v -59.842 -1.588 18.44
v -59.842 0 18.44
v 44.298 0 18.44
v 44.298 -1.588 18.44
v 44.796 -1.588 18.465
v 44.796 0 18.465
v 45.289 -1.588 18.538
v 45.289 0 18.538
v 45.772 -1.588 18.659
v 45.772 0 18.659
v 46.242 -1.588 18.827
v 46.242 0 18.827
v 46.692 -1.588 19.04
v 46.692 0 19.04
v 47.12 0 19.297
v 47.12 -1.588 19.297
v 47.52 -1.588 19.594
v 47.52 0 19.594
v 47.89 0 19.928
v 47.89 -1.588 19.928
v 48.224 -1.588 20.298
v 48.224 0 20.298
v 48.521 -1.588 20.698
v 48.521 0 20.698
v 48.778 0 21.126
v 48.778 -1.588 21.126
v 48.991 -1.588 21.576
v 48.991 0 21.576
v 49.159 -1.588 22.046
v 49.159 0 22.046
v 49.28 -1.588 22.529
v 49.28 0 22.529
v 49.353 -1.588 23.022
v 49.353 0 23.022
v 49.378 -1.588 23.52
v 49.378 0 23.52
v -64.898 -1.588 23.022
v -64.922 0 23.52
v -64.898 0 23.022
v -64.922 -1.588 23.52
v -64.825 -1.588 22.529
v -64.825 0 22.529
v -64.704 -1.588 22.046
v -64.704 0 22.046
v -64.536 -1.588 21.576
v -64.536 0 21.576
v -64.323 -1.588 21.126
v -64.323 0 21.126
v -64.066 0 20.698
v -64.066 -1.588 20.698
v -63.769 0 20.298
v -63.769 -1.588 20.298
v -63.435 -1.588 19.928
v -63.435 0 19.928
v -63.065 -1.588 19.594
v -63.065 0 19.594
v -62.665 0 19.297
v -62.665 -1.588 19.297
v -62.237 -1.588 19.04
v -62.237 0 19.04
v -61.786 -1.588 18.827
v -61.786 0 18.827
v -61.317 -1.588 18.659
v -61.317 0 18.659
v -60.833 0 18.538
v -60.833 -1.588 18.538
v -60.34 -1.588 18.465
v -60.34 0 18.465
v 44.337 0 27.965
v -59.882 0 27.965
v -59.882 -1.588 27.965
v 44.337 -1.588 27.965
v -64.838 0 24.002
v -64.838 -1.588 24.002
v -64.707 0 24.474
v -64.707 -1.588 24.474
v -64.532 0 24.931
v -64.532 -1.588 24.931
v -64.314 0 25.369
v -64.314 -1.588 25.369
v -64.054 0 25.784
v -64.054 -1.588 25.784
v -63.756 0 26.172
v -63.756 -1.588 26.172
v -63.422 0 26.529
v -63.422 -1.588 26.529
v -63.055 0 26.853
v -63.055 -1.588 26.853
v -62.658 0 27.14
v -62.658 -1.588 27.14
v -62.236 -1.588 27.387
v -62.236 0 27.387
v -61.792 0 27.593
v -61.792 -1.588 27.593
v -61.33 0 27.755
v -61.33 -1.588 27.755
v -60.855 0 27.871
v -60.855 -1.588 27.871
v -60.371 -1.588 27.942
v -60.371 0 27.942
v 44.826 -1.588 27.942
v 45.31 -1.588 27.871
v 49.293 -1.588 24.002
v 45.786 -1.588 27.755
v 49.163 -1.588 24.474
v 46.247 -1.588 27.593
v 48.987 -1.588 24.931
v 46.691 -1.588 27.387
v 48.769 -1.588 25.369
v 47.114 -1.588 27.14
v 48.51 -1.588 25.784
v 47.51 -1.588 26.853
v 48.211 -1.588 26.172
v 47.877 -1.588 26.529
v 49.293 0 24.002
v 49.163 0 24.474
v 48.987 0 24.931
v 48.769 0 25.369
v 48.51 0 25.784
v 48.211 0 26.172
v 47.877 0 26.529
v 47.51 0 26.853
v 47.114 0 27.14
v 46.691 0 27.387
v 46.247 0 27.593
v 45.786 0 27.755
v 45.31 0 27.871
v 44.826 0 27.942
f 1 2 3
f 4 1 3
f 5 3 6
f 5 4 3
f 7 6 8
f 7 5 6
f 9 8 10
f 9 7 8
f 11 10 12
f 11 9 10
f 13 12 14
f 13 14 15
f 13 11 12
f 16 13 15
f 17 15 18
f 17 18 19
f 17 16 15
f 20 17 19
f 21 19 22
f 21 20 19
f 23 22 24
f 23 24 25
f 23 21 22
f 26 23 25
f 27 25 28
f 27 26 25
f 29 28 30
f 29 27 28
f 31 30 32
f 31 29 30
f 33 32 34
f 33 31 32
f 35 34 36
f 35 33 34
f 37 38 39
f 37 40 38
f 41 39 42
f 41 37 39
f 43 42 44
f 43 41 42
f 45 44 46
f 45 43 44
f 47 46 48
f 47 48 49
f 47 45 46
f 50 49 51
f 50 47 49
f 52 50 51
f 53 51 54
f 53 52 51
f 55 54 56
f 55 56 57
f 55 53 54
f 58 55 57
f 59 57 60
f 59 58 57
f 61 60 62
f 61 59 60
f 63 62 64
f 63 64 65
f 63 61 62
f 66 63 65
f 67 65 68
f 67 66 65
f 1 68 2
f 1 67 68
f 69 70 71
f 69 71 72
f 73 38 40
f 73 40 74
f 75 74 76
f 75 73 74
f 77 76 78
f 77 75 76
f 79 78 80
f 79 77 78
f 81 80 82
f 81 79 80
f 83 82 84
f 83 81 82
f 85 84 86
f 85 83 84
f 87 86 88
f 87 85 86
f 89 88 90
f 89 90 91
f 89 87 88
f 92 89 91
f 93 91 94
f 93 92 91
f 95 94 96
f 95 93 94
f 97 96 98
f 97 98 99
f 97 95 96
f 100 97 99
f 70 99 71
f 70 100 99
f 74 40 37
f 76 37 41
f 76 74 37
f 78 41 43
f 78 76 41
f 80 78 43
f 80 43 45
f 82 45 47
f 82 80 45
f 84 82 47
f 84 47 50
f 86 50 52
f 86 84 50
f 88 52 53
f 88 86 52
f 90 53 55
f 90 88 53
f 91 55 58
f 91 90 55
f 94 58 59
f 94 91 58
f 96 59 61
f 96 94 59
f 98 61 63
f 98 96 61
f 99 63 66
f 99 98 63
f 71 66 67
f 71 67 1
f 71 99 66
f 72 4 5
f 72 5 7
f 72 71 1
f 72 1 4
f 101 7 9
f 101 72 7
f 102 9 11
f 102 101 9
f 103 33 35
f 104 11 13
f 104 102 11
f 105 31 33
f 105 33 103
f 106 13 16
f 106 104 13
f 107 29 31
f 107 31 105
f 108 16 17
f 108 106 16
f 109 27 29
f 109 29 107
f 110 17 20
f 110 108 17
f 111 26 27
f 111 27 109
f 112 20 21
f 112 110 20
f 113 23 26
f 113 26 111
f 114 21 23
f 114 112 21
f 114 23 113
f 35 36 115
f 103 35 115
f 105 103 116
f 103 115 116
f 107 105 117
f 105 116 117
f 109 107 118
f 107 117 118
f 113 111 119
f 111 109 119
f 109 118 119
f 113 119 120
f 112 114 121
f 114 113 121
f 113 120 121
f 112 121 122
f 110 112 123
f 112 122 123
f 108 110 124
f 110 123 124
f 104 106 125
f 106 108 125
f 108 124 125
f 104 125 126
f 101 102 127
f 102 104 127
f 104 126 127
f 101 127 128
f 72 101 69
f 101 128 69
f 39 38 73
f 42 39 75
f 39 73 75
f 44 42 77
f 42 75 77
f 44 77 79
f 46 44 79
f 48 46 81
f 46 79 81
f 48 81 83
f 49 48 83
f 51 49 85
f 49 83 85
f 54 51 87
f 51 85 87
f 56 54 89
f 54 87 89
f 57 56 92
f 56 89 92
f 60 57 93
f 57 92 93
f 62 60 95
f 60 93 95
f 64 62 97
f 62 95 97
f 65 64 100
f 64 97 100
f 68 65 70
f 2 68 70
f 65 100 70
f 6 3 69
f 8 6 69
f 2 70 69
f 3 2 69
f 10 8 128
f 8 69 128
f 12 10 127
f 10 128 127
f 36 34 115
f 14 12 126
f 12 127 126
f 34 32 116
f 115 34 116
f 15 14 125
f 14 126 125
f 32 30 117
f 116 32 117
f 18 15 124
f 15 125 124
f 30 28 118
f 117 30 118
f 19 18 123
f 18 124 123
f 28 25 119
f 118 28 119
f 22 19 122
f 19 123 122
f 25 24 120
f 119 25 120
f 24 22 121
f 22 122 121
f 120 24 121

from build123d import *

# Parameters (mm, degrees)
F0_W        = 114.3
F0_H        = 9.525
F1_DEPTH    = 1.5875
F2_R        = 5.08
F3_T1_DEPTH = 26.7882812379
F4_R        = 5.08
F5_T1_DEPTH = 26.7882812379


# Not quite as in the source:
# - a fillet or chamfer that OpenCascade refuses, or shapes differently, is made with other operations: its cross-section is extruded or revolved along the edge and cut away or added


with BuildPart() as f1:
    # F0 (on Front) → F1 (new body)
    with BuildSketch(Plane.XZ):
        with Locations((-7.7723998189, 23.2028993189)):
            Rectangle(F0_W, F0_H)
    extrude(amount=F1_DEPTH)

    # F2
    f2_edges = [f1.edges().sort_by_distance(p)[0] for p in [
        (-64.9224, -0.79375, 18.440399),
    ]]
    fillet(f2_edges, radius=F2_R)

    # F3: fillet of radius 5.08 on 1 edges, made by hand

    # F3_s2 → F3_t1 (cut)
    with BuildSketch(Plane.XZ.offset(-12.6003906189)):
        with BuildLine():
            ThreePointArc((-64.9223998189, 23.5203993189), (-63.2423477364, 26.6953993189), (-59.8822435713, 27.9653993189))
            Line((-59.8822435713, 27.9653993189), (-64.9223998189, 27.9653993189))
            Line((-64.9223998189, 27.9653993189), (-64.9223998189, 23.5203993189))
        make_face()
    extrude(amount=F3_T1_DEPTH, mode=Mode.SUBTRACT)

    # F4
    f4_edges = [f1.edges().sort_by_distance(p)[0] for p in [
        (49.3776, -0.79375, 18.440399),
    ]]
    fillet(f4_edges, radius=F4_R)

    # F5: fillet of radius 5.08 on 1 edges, made by hand

    # F5_s2 → F5_t1 (cut)
    with BuildSketch(Plane.XZ.offset(-12.6003906189)):
        with BuildLine():
            ThreePointArc((49.3776001811, 23.5203993189), (47.6975480986, 26.6953993189), (44.3374439335, 27.9653993189))
            Line((44.3374439335, 27.9653993189), (49.3776001811, 27.9653993189))
            Line((49.3776001811, 27.9653993189), (49.3776001811, 23.5203993189))
        make_face()
    extrude(amount=F5_T1_DEPTH, mode=Mode.SUBTRACT)


solid = f1.part
